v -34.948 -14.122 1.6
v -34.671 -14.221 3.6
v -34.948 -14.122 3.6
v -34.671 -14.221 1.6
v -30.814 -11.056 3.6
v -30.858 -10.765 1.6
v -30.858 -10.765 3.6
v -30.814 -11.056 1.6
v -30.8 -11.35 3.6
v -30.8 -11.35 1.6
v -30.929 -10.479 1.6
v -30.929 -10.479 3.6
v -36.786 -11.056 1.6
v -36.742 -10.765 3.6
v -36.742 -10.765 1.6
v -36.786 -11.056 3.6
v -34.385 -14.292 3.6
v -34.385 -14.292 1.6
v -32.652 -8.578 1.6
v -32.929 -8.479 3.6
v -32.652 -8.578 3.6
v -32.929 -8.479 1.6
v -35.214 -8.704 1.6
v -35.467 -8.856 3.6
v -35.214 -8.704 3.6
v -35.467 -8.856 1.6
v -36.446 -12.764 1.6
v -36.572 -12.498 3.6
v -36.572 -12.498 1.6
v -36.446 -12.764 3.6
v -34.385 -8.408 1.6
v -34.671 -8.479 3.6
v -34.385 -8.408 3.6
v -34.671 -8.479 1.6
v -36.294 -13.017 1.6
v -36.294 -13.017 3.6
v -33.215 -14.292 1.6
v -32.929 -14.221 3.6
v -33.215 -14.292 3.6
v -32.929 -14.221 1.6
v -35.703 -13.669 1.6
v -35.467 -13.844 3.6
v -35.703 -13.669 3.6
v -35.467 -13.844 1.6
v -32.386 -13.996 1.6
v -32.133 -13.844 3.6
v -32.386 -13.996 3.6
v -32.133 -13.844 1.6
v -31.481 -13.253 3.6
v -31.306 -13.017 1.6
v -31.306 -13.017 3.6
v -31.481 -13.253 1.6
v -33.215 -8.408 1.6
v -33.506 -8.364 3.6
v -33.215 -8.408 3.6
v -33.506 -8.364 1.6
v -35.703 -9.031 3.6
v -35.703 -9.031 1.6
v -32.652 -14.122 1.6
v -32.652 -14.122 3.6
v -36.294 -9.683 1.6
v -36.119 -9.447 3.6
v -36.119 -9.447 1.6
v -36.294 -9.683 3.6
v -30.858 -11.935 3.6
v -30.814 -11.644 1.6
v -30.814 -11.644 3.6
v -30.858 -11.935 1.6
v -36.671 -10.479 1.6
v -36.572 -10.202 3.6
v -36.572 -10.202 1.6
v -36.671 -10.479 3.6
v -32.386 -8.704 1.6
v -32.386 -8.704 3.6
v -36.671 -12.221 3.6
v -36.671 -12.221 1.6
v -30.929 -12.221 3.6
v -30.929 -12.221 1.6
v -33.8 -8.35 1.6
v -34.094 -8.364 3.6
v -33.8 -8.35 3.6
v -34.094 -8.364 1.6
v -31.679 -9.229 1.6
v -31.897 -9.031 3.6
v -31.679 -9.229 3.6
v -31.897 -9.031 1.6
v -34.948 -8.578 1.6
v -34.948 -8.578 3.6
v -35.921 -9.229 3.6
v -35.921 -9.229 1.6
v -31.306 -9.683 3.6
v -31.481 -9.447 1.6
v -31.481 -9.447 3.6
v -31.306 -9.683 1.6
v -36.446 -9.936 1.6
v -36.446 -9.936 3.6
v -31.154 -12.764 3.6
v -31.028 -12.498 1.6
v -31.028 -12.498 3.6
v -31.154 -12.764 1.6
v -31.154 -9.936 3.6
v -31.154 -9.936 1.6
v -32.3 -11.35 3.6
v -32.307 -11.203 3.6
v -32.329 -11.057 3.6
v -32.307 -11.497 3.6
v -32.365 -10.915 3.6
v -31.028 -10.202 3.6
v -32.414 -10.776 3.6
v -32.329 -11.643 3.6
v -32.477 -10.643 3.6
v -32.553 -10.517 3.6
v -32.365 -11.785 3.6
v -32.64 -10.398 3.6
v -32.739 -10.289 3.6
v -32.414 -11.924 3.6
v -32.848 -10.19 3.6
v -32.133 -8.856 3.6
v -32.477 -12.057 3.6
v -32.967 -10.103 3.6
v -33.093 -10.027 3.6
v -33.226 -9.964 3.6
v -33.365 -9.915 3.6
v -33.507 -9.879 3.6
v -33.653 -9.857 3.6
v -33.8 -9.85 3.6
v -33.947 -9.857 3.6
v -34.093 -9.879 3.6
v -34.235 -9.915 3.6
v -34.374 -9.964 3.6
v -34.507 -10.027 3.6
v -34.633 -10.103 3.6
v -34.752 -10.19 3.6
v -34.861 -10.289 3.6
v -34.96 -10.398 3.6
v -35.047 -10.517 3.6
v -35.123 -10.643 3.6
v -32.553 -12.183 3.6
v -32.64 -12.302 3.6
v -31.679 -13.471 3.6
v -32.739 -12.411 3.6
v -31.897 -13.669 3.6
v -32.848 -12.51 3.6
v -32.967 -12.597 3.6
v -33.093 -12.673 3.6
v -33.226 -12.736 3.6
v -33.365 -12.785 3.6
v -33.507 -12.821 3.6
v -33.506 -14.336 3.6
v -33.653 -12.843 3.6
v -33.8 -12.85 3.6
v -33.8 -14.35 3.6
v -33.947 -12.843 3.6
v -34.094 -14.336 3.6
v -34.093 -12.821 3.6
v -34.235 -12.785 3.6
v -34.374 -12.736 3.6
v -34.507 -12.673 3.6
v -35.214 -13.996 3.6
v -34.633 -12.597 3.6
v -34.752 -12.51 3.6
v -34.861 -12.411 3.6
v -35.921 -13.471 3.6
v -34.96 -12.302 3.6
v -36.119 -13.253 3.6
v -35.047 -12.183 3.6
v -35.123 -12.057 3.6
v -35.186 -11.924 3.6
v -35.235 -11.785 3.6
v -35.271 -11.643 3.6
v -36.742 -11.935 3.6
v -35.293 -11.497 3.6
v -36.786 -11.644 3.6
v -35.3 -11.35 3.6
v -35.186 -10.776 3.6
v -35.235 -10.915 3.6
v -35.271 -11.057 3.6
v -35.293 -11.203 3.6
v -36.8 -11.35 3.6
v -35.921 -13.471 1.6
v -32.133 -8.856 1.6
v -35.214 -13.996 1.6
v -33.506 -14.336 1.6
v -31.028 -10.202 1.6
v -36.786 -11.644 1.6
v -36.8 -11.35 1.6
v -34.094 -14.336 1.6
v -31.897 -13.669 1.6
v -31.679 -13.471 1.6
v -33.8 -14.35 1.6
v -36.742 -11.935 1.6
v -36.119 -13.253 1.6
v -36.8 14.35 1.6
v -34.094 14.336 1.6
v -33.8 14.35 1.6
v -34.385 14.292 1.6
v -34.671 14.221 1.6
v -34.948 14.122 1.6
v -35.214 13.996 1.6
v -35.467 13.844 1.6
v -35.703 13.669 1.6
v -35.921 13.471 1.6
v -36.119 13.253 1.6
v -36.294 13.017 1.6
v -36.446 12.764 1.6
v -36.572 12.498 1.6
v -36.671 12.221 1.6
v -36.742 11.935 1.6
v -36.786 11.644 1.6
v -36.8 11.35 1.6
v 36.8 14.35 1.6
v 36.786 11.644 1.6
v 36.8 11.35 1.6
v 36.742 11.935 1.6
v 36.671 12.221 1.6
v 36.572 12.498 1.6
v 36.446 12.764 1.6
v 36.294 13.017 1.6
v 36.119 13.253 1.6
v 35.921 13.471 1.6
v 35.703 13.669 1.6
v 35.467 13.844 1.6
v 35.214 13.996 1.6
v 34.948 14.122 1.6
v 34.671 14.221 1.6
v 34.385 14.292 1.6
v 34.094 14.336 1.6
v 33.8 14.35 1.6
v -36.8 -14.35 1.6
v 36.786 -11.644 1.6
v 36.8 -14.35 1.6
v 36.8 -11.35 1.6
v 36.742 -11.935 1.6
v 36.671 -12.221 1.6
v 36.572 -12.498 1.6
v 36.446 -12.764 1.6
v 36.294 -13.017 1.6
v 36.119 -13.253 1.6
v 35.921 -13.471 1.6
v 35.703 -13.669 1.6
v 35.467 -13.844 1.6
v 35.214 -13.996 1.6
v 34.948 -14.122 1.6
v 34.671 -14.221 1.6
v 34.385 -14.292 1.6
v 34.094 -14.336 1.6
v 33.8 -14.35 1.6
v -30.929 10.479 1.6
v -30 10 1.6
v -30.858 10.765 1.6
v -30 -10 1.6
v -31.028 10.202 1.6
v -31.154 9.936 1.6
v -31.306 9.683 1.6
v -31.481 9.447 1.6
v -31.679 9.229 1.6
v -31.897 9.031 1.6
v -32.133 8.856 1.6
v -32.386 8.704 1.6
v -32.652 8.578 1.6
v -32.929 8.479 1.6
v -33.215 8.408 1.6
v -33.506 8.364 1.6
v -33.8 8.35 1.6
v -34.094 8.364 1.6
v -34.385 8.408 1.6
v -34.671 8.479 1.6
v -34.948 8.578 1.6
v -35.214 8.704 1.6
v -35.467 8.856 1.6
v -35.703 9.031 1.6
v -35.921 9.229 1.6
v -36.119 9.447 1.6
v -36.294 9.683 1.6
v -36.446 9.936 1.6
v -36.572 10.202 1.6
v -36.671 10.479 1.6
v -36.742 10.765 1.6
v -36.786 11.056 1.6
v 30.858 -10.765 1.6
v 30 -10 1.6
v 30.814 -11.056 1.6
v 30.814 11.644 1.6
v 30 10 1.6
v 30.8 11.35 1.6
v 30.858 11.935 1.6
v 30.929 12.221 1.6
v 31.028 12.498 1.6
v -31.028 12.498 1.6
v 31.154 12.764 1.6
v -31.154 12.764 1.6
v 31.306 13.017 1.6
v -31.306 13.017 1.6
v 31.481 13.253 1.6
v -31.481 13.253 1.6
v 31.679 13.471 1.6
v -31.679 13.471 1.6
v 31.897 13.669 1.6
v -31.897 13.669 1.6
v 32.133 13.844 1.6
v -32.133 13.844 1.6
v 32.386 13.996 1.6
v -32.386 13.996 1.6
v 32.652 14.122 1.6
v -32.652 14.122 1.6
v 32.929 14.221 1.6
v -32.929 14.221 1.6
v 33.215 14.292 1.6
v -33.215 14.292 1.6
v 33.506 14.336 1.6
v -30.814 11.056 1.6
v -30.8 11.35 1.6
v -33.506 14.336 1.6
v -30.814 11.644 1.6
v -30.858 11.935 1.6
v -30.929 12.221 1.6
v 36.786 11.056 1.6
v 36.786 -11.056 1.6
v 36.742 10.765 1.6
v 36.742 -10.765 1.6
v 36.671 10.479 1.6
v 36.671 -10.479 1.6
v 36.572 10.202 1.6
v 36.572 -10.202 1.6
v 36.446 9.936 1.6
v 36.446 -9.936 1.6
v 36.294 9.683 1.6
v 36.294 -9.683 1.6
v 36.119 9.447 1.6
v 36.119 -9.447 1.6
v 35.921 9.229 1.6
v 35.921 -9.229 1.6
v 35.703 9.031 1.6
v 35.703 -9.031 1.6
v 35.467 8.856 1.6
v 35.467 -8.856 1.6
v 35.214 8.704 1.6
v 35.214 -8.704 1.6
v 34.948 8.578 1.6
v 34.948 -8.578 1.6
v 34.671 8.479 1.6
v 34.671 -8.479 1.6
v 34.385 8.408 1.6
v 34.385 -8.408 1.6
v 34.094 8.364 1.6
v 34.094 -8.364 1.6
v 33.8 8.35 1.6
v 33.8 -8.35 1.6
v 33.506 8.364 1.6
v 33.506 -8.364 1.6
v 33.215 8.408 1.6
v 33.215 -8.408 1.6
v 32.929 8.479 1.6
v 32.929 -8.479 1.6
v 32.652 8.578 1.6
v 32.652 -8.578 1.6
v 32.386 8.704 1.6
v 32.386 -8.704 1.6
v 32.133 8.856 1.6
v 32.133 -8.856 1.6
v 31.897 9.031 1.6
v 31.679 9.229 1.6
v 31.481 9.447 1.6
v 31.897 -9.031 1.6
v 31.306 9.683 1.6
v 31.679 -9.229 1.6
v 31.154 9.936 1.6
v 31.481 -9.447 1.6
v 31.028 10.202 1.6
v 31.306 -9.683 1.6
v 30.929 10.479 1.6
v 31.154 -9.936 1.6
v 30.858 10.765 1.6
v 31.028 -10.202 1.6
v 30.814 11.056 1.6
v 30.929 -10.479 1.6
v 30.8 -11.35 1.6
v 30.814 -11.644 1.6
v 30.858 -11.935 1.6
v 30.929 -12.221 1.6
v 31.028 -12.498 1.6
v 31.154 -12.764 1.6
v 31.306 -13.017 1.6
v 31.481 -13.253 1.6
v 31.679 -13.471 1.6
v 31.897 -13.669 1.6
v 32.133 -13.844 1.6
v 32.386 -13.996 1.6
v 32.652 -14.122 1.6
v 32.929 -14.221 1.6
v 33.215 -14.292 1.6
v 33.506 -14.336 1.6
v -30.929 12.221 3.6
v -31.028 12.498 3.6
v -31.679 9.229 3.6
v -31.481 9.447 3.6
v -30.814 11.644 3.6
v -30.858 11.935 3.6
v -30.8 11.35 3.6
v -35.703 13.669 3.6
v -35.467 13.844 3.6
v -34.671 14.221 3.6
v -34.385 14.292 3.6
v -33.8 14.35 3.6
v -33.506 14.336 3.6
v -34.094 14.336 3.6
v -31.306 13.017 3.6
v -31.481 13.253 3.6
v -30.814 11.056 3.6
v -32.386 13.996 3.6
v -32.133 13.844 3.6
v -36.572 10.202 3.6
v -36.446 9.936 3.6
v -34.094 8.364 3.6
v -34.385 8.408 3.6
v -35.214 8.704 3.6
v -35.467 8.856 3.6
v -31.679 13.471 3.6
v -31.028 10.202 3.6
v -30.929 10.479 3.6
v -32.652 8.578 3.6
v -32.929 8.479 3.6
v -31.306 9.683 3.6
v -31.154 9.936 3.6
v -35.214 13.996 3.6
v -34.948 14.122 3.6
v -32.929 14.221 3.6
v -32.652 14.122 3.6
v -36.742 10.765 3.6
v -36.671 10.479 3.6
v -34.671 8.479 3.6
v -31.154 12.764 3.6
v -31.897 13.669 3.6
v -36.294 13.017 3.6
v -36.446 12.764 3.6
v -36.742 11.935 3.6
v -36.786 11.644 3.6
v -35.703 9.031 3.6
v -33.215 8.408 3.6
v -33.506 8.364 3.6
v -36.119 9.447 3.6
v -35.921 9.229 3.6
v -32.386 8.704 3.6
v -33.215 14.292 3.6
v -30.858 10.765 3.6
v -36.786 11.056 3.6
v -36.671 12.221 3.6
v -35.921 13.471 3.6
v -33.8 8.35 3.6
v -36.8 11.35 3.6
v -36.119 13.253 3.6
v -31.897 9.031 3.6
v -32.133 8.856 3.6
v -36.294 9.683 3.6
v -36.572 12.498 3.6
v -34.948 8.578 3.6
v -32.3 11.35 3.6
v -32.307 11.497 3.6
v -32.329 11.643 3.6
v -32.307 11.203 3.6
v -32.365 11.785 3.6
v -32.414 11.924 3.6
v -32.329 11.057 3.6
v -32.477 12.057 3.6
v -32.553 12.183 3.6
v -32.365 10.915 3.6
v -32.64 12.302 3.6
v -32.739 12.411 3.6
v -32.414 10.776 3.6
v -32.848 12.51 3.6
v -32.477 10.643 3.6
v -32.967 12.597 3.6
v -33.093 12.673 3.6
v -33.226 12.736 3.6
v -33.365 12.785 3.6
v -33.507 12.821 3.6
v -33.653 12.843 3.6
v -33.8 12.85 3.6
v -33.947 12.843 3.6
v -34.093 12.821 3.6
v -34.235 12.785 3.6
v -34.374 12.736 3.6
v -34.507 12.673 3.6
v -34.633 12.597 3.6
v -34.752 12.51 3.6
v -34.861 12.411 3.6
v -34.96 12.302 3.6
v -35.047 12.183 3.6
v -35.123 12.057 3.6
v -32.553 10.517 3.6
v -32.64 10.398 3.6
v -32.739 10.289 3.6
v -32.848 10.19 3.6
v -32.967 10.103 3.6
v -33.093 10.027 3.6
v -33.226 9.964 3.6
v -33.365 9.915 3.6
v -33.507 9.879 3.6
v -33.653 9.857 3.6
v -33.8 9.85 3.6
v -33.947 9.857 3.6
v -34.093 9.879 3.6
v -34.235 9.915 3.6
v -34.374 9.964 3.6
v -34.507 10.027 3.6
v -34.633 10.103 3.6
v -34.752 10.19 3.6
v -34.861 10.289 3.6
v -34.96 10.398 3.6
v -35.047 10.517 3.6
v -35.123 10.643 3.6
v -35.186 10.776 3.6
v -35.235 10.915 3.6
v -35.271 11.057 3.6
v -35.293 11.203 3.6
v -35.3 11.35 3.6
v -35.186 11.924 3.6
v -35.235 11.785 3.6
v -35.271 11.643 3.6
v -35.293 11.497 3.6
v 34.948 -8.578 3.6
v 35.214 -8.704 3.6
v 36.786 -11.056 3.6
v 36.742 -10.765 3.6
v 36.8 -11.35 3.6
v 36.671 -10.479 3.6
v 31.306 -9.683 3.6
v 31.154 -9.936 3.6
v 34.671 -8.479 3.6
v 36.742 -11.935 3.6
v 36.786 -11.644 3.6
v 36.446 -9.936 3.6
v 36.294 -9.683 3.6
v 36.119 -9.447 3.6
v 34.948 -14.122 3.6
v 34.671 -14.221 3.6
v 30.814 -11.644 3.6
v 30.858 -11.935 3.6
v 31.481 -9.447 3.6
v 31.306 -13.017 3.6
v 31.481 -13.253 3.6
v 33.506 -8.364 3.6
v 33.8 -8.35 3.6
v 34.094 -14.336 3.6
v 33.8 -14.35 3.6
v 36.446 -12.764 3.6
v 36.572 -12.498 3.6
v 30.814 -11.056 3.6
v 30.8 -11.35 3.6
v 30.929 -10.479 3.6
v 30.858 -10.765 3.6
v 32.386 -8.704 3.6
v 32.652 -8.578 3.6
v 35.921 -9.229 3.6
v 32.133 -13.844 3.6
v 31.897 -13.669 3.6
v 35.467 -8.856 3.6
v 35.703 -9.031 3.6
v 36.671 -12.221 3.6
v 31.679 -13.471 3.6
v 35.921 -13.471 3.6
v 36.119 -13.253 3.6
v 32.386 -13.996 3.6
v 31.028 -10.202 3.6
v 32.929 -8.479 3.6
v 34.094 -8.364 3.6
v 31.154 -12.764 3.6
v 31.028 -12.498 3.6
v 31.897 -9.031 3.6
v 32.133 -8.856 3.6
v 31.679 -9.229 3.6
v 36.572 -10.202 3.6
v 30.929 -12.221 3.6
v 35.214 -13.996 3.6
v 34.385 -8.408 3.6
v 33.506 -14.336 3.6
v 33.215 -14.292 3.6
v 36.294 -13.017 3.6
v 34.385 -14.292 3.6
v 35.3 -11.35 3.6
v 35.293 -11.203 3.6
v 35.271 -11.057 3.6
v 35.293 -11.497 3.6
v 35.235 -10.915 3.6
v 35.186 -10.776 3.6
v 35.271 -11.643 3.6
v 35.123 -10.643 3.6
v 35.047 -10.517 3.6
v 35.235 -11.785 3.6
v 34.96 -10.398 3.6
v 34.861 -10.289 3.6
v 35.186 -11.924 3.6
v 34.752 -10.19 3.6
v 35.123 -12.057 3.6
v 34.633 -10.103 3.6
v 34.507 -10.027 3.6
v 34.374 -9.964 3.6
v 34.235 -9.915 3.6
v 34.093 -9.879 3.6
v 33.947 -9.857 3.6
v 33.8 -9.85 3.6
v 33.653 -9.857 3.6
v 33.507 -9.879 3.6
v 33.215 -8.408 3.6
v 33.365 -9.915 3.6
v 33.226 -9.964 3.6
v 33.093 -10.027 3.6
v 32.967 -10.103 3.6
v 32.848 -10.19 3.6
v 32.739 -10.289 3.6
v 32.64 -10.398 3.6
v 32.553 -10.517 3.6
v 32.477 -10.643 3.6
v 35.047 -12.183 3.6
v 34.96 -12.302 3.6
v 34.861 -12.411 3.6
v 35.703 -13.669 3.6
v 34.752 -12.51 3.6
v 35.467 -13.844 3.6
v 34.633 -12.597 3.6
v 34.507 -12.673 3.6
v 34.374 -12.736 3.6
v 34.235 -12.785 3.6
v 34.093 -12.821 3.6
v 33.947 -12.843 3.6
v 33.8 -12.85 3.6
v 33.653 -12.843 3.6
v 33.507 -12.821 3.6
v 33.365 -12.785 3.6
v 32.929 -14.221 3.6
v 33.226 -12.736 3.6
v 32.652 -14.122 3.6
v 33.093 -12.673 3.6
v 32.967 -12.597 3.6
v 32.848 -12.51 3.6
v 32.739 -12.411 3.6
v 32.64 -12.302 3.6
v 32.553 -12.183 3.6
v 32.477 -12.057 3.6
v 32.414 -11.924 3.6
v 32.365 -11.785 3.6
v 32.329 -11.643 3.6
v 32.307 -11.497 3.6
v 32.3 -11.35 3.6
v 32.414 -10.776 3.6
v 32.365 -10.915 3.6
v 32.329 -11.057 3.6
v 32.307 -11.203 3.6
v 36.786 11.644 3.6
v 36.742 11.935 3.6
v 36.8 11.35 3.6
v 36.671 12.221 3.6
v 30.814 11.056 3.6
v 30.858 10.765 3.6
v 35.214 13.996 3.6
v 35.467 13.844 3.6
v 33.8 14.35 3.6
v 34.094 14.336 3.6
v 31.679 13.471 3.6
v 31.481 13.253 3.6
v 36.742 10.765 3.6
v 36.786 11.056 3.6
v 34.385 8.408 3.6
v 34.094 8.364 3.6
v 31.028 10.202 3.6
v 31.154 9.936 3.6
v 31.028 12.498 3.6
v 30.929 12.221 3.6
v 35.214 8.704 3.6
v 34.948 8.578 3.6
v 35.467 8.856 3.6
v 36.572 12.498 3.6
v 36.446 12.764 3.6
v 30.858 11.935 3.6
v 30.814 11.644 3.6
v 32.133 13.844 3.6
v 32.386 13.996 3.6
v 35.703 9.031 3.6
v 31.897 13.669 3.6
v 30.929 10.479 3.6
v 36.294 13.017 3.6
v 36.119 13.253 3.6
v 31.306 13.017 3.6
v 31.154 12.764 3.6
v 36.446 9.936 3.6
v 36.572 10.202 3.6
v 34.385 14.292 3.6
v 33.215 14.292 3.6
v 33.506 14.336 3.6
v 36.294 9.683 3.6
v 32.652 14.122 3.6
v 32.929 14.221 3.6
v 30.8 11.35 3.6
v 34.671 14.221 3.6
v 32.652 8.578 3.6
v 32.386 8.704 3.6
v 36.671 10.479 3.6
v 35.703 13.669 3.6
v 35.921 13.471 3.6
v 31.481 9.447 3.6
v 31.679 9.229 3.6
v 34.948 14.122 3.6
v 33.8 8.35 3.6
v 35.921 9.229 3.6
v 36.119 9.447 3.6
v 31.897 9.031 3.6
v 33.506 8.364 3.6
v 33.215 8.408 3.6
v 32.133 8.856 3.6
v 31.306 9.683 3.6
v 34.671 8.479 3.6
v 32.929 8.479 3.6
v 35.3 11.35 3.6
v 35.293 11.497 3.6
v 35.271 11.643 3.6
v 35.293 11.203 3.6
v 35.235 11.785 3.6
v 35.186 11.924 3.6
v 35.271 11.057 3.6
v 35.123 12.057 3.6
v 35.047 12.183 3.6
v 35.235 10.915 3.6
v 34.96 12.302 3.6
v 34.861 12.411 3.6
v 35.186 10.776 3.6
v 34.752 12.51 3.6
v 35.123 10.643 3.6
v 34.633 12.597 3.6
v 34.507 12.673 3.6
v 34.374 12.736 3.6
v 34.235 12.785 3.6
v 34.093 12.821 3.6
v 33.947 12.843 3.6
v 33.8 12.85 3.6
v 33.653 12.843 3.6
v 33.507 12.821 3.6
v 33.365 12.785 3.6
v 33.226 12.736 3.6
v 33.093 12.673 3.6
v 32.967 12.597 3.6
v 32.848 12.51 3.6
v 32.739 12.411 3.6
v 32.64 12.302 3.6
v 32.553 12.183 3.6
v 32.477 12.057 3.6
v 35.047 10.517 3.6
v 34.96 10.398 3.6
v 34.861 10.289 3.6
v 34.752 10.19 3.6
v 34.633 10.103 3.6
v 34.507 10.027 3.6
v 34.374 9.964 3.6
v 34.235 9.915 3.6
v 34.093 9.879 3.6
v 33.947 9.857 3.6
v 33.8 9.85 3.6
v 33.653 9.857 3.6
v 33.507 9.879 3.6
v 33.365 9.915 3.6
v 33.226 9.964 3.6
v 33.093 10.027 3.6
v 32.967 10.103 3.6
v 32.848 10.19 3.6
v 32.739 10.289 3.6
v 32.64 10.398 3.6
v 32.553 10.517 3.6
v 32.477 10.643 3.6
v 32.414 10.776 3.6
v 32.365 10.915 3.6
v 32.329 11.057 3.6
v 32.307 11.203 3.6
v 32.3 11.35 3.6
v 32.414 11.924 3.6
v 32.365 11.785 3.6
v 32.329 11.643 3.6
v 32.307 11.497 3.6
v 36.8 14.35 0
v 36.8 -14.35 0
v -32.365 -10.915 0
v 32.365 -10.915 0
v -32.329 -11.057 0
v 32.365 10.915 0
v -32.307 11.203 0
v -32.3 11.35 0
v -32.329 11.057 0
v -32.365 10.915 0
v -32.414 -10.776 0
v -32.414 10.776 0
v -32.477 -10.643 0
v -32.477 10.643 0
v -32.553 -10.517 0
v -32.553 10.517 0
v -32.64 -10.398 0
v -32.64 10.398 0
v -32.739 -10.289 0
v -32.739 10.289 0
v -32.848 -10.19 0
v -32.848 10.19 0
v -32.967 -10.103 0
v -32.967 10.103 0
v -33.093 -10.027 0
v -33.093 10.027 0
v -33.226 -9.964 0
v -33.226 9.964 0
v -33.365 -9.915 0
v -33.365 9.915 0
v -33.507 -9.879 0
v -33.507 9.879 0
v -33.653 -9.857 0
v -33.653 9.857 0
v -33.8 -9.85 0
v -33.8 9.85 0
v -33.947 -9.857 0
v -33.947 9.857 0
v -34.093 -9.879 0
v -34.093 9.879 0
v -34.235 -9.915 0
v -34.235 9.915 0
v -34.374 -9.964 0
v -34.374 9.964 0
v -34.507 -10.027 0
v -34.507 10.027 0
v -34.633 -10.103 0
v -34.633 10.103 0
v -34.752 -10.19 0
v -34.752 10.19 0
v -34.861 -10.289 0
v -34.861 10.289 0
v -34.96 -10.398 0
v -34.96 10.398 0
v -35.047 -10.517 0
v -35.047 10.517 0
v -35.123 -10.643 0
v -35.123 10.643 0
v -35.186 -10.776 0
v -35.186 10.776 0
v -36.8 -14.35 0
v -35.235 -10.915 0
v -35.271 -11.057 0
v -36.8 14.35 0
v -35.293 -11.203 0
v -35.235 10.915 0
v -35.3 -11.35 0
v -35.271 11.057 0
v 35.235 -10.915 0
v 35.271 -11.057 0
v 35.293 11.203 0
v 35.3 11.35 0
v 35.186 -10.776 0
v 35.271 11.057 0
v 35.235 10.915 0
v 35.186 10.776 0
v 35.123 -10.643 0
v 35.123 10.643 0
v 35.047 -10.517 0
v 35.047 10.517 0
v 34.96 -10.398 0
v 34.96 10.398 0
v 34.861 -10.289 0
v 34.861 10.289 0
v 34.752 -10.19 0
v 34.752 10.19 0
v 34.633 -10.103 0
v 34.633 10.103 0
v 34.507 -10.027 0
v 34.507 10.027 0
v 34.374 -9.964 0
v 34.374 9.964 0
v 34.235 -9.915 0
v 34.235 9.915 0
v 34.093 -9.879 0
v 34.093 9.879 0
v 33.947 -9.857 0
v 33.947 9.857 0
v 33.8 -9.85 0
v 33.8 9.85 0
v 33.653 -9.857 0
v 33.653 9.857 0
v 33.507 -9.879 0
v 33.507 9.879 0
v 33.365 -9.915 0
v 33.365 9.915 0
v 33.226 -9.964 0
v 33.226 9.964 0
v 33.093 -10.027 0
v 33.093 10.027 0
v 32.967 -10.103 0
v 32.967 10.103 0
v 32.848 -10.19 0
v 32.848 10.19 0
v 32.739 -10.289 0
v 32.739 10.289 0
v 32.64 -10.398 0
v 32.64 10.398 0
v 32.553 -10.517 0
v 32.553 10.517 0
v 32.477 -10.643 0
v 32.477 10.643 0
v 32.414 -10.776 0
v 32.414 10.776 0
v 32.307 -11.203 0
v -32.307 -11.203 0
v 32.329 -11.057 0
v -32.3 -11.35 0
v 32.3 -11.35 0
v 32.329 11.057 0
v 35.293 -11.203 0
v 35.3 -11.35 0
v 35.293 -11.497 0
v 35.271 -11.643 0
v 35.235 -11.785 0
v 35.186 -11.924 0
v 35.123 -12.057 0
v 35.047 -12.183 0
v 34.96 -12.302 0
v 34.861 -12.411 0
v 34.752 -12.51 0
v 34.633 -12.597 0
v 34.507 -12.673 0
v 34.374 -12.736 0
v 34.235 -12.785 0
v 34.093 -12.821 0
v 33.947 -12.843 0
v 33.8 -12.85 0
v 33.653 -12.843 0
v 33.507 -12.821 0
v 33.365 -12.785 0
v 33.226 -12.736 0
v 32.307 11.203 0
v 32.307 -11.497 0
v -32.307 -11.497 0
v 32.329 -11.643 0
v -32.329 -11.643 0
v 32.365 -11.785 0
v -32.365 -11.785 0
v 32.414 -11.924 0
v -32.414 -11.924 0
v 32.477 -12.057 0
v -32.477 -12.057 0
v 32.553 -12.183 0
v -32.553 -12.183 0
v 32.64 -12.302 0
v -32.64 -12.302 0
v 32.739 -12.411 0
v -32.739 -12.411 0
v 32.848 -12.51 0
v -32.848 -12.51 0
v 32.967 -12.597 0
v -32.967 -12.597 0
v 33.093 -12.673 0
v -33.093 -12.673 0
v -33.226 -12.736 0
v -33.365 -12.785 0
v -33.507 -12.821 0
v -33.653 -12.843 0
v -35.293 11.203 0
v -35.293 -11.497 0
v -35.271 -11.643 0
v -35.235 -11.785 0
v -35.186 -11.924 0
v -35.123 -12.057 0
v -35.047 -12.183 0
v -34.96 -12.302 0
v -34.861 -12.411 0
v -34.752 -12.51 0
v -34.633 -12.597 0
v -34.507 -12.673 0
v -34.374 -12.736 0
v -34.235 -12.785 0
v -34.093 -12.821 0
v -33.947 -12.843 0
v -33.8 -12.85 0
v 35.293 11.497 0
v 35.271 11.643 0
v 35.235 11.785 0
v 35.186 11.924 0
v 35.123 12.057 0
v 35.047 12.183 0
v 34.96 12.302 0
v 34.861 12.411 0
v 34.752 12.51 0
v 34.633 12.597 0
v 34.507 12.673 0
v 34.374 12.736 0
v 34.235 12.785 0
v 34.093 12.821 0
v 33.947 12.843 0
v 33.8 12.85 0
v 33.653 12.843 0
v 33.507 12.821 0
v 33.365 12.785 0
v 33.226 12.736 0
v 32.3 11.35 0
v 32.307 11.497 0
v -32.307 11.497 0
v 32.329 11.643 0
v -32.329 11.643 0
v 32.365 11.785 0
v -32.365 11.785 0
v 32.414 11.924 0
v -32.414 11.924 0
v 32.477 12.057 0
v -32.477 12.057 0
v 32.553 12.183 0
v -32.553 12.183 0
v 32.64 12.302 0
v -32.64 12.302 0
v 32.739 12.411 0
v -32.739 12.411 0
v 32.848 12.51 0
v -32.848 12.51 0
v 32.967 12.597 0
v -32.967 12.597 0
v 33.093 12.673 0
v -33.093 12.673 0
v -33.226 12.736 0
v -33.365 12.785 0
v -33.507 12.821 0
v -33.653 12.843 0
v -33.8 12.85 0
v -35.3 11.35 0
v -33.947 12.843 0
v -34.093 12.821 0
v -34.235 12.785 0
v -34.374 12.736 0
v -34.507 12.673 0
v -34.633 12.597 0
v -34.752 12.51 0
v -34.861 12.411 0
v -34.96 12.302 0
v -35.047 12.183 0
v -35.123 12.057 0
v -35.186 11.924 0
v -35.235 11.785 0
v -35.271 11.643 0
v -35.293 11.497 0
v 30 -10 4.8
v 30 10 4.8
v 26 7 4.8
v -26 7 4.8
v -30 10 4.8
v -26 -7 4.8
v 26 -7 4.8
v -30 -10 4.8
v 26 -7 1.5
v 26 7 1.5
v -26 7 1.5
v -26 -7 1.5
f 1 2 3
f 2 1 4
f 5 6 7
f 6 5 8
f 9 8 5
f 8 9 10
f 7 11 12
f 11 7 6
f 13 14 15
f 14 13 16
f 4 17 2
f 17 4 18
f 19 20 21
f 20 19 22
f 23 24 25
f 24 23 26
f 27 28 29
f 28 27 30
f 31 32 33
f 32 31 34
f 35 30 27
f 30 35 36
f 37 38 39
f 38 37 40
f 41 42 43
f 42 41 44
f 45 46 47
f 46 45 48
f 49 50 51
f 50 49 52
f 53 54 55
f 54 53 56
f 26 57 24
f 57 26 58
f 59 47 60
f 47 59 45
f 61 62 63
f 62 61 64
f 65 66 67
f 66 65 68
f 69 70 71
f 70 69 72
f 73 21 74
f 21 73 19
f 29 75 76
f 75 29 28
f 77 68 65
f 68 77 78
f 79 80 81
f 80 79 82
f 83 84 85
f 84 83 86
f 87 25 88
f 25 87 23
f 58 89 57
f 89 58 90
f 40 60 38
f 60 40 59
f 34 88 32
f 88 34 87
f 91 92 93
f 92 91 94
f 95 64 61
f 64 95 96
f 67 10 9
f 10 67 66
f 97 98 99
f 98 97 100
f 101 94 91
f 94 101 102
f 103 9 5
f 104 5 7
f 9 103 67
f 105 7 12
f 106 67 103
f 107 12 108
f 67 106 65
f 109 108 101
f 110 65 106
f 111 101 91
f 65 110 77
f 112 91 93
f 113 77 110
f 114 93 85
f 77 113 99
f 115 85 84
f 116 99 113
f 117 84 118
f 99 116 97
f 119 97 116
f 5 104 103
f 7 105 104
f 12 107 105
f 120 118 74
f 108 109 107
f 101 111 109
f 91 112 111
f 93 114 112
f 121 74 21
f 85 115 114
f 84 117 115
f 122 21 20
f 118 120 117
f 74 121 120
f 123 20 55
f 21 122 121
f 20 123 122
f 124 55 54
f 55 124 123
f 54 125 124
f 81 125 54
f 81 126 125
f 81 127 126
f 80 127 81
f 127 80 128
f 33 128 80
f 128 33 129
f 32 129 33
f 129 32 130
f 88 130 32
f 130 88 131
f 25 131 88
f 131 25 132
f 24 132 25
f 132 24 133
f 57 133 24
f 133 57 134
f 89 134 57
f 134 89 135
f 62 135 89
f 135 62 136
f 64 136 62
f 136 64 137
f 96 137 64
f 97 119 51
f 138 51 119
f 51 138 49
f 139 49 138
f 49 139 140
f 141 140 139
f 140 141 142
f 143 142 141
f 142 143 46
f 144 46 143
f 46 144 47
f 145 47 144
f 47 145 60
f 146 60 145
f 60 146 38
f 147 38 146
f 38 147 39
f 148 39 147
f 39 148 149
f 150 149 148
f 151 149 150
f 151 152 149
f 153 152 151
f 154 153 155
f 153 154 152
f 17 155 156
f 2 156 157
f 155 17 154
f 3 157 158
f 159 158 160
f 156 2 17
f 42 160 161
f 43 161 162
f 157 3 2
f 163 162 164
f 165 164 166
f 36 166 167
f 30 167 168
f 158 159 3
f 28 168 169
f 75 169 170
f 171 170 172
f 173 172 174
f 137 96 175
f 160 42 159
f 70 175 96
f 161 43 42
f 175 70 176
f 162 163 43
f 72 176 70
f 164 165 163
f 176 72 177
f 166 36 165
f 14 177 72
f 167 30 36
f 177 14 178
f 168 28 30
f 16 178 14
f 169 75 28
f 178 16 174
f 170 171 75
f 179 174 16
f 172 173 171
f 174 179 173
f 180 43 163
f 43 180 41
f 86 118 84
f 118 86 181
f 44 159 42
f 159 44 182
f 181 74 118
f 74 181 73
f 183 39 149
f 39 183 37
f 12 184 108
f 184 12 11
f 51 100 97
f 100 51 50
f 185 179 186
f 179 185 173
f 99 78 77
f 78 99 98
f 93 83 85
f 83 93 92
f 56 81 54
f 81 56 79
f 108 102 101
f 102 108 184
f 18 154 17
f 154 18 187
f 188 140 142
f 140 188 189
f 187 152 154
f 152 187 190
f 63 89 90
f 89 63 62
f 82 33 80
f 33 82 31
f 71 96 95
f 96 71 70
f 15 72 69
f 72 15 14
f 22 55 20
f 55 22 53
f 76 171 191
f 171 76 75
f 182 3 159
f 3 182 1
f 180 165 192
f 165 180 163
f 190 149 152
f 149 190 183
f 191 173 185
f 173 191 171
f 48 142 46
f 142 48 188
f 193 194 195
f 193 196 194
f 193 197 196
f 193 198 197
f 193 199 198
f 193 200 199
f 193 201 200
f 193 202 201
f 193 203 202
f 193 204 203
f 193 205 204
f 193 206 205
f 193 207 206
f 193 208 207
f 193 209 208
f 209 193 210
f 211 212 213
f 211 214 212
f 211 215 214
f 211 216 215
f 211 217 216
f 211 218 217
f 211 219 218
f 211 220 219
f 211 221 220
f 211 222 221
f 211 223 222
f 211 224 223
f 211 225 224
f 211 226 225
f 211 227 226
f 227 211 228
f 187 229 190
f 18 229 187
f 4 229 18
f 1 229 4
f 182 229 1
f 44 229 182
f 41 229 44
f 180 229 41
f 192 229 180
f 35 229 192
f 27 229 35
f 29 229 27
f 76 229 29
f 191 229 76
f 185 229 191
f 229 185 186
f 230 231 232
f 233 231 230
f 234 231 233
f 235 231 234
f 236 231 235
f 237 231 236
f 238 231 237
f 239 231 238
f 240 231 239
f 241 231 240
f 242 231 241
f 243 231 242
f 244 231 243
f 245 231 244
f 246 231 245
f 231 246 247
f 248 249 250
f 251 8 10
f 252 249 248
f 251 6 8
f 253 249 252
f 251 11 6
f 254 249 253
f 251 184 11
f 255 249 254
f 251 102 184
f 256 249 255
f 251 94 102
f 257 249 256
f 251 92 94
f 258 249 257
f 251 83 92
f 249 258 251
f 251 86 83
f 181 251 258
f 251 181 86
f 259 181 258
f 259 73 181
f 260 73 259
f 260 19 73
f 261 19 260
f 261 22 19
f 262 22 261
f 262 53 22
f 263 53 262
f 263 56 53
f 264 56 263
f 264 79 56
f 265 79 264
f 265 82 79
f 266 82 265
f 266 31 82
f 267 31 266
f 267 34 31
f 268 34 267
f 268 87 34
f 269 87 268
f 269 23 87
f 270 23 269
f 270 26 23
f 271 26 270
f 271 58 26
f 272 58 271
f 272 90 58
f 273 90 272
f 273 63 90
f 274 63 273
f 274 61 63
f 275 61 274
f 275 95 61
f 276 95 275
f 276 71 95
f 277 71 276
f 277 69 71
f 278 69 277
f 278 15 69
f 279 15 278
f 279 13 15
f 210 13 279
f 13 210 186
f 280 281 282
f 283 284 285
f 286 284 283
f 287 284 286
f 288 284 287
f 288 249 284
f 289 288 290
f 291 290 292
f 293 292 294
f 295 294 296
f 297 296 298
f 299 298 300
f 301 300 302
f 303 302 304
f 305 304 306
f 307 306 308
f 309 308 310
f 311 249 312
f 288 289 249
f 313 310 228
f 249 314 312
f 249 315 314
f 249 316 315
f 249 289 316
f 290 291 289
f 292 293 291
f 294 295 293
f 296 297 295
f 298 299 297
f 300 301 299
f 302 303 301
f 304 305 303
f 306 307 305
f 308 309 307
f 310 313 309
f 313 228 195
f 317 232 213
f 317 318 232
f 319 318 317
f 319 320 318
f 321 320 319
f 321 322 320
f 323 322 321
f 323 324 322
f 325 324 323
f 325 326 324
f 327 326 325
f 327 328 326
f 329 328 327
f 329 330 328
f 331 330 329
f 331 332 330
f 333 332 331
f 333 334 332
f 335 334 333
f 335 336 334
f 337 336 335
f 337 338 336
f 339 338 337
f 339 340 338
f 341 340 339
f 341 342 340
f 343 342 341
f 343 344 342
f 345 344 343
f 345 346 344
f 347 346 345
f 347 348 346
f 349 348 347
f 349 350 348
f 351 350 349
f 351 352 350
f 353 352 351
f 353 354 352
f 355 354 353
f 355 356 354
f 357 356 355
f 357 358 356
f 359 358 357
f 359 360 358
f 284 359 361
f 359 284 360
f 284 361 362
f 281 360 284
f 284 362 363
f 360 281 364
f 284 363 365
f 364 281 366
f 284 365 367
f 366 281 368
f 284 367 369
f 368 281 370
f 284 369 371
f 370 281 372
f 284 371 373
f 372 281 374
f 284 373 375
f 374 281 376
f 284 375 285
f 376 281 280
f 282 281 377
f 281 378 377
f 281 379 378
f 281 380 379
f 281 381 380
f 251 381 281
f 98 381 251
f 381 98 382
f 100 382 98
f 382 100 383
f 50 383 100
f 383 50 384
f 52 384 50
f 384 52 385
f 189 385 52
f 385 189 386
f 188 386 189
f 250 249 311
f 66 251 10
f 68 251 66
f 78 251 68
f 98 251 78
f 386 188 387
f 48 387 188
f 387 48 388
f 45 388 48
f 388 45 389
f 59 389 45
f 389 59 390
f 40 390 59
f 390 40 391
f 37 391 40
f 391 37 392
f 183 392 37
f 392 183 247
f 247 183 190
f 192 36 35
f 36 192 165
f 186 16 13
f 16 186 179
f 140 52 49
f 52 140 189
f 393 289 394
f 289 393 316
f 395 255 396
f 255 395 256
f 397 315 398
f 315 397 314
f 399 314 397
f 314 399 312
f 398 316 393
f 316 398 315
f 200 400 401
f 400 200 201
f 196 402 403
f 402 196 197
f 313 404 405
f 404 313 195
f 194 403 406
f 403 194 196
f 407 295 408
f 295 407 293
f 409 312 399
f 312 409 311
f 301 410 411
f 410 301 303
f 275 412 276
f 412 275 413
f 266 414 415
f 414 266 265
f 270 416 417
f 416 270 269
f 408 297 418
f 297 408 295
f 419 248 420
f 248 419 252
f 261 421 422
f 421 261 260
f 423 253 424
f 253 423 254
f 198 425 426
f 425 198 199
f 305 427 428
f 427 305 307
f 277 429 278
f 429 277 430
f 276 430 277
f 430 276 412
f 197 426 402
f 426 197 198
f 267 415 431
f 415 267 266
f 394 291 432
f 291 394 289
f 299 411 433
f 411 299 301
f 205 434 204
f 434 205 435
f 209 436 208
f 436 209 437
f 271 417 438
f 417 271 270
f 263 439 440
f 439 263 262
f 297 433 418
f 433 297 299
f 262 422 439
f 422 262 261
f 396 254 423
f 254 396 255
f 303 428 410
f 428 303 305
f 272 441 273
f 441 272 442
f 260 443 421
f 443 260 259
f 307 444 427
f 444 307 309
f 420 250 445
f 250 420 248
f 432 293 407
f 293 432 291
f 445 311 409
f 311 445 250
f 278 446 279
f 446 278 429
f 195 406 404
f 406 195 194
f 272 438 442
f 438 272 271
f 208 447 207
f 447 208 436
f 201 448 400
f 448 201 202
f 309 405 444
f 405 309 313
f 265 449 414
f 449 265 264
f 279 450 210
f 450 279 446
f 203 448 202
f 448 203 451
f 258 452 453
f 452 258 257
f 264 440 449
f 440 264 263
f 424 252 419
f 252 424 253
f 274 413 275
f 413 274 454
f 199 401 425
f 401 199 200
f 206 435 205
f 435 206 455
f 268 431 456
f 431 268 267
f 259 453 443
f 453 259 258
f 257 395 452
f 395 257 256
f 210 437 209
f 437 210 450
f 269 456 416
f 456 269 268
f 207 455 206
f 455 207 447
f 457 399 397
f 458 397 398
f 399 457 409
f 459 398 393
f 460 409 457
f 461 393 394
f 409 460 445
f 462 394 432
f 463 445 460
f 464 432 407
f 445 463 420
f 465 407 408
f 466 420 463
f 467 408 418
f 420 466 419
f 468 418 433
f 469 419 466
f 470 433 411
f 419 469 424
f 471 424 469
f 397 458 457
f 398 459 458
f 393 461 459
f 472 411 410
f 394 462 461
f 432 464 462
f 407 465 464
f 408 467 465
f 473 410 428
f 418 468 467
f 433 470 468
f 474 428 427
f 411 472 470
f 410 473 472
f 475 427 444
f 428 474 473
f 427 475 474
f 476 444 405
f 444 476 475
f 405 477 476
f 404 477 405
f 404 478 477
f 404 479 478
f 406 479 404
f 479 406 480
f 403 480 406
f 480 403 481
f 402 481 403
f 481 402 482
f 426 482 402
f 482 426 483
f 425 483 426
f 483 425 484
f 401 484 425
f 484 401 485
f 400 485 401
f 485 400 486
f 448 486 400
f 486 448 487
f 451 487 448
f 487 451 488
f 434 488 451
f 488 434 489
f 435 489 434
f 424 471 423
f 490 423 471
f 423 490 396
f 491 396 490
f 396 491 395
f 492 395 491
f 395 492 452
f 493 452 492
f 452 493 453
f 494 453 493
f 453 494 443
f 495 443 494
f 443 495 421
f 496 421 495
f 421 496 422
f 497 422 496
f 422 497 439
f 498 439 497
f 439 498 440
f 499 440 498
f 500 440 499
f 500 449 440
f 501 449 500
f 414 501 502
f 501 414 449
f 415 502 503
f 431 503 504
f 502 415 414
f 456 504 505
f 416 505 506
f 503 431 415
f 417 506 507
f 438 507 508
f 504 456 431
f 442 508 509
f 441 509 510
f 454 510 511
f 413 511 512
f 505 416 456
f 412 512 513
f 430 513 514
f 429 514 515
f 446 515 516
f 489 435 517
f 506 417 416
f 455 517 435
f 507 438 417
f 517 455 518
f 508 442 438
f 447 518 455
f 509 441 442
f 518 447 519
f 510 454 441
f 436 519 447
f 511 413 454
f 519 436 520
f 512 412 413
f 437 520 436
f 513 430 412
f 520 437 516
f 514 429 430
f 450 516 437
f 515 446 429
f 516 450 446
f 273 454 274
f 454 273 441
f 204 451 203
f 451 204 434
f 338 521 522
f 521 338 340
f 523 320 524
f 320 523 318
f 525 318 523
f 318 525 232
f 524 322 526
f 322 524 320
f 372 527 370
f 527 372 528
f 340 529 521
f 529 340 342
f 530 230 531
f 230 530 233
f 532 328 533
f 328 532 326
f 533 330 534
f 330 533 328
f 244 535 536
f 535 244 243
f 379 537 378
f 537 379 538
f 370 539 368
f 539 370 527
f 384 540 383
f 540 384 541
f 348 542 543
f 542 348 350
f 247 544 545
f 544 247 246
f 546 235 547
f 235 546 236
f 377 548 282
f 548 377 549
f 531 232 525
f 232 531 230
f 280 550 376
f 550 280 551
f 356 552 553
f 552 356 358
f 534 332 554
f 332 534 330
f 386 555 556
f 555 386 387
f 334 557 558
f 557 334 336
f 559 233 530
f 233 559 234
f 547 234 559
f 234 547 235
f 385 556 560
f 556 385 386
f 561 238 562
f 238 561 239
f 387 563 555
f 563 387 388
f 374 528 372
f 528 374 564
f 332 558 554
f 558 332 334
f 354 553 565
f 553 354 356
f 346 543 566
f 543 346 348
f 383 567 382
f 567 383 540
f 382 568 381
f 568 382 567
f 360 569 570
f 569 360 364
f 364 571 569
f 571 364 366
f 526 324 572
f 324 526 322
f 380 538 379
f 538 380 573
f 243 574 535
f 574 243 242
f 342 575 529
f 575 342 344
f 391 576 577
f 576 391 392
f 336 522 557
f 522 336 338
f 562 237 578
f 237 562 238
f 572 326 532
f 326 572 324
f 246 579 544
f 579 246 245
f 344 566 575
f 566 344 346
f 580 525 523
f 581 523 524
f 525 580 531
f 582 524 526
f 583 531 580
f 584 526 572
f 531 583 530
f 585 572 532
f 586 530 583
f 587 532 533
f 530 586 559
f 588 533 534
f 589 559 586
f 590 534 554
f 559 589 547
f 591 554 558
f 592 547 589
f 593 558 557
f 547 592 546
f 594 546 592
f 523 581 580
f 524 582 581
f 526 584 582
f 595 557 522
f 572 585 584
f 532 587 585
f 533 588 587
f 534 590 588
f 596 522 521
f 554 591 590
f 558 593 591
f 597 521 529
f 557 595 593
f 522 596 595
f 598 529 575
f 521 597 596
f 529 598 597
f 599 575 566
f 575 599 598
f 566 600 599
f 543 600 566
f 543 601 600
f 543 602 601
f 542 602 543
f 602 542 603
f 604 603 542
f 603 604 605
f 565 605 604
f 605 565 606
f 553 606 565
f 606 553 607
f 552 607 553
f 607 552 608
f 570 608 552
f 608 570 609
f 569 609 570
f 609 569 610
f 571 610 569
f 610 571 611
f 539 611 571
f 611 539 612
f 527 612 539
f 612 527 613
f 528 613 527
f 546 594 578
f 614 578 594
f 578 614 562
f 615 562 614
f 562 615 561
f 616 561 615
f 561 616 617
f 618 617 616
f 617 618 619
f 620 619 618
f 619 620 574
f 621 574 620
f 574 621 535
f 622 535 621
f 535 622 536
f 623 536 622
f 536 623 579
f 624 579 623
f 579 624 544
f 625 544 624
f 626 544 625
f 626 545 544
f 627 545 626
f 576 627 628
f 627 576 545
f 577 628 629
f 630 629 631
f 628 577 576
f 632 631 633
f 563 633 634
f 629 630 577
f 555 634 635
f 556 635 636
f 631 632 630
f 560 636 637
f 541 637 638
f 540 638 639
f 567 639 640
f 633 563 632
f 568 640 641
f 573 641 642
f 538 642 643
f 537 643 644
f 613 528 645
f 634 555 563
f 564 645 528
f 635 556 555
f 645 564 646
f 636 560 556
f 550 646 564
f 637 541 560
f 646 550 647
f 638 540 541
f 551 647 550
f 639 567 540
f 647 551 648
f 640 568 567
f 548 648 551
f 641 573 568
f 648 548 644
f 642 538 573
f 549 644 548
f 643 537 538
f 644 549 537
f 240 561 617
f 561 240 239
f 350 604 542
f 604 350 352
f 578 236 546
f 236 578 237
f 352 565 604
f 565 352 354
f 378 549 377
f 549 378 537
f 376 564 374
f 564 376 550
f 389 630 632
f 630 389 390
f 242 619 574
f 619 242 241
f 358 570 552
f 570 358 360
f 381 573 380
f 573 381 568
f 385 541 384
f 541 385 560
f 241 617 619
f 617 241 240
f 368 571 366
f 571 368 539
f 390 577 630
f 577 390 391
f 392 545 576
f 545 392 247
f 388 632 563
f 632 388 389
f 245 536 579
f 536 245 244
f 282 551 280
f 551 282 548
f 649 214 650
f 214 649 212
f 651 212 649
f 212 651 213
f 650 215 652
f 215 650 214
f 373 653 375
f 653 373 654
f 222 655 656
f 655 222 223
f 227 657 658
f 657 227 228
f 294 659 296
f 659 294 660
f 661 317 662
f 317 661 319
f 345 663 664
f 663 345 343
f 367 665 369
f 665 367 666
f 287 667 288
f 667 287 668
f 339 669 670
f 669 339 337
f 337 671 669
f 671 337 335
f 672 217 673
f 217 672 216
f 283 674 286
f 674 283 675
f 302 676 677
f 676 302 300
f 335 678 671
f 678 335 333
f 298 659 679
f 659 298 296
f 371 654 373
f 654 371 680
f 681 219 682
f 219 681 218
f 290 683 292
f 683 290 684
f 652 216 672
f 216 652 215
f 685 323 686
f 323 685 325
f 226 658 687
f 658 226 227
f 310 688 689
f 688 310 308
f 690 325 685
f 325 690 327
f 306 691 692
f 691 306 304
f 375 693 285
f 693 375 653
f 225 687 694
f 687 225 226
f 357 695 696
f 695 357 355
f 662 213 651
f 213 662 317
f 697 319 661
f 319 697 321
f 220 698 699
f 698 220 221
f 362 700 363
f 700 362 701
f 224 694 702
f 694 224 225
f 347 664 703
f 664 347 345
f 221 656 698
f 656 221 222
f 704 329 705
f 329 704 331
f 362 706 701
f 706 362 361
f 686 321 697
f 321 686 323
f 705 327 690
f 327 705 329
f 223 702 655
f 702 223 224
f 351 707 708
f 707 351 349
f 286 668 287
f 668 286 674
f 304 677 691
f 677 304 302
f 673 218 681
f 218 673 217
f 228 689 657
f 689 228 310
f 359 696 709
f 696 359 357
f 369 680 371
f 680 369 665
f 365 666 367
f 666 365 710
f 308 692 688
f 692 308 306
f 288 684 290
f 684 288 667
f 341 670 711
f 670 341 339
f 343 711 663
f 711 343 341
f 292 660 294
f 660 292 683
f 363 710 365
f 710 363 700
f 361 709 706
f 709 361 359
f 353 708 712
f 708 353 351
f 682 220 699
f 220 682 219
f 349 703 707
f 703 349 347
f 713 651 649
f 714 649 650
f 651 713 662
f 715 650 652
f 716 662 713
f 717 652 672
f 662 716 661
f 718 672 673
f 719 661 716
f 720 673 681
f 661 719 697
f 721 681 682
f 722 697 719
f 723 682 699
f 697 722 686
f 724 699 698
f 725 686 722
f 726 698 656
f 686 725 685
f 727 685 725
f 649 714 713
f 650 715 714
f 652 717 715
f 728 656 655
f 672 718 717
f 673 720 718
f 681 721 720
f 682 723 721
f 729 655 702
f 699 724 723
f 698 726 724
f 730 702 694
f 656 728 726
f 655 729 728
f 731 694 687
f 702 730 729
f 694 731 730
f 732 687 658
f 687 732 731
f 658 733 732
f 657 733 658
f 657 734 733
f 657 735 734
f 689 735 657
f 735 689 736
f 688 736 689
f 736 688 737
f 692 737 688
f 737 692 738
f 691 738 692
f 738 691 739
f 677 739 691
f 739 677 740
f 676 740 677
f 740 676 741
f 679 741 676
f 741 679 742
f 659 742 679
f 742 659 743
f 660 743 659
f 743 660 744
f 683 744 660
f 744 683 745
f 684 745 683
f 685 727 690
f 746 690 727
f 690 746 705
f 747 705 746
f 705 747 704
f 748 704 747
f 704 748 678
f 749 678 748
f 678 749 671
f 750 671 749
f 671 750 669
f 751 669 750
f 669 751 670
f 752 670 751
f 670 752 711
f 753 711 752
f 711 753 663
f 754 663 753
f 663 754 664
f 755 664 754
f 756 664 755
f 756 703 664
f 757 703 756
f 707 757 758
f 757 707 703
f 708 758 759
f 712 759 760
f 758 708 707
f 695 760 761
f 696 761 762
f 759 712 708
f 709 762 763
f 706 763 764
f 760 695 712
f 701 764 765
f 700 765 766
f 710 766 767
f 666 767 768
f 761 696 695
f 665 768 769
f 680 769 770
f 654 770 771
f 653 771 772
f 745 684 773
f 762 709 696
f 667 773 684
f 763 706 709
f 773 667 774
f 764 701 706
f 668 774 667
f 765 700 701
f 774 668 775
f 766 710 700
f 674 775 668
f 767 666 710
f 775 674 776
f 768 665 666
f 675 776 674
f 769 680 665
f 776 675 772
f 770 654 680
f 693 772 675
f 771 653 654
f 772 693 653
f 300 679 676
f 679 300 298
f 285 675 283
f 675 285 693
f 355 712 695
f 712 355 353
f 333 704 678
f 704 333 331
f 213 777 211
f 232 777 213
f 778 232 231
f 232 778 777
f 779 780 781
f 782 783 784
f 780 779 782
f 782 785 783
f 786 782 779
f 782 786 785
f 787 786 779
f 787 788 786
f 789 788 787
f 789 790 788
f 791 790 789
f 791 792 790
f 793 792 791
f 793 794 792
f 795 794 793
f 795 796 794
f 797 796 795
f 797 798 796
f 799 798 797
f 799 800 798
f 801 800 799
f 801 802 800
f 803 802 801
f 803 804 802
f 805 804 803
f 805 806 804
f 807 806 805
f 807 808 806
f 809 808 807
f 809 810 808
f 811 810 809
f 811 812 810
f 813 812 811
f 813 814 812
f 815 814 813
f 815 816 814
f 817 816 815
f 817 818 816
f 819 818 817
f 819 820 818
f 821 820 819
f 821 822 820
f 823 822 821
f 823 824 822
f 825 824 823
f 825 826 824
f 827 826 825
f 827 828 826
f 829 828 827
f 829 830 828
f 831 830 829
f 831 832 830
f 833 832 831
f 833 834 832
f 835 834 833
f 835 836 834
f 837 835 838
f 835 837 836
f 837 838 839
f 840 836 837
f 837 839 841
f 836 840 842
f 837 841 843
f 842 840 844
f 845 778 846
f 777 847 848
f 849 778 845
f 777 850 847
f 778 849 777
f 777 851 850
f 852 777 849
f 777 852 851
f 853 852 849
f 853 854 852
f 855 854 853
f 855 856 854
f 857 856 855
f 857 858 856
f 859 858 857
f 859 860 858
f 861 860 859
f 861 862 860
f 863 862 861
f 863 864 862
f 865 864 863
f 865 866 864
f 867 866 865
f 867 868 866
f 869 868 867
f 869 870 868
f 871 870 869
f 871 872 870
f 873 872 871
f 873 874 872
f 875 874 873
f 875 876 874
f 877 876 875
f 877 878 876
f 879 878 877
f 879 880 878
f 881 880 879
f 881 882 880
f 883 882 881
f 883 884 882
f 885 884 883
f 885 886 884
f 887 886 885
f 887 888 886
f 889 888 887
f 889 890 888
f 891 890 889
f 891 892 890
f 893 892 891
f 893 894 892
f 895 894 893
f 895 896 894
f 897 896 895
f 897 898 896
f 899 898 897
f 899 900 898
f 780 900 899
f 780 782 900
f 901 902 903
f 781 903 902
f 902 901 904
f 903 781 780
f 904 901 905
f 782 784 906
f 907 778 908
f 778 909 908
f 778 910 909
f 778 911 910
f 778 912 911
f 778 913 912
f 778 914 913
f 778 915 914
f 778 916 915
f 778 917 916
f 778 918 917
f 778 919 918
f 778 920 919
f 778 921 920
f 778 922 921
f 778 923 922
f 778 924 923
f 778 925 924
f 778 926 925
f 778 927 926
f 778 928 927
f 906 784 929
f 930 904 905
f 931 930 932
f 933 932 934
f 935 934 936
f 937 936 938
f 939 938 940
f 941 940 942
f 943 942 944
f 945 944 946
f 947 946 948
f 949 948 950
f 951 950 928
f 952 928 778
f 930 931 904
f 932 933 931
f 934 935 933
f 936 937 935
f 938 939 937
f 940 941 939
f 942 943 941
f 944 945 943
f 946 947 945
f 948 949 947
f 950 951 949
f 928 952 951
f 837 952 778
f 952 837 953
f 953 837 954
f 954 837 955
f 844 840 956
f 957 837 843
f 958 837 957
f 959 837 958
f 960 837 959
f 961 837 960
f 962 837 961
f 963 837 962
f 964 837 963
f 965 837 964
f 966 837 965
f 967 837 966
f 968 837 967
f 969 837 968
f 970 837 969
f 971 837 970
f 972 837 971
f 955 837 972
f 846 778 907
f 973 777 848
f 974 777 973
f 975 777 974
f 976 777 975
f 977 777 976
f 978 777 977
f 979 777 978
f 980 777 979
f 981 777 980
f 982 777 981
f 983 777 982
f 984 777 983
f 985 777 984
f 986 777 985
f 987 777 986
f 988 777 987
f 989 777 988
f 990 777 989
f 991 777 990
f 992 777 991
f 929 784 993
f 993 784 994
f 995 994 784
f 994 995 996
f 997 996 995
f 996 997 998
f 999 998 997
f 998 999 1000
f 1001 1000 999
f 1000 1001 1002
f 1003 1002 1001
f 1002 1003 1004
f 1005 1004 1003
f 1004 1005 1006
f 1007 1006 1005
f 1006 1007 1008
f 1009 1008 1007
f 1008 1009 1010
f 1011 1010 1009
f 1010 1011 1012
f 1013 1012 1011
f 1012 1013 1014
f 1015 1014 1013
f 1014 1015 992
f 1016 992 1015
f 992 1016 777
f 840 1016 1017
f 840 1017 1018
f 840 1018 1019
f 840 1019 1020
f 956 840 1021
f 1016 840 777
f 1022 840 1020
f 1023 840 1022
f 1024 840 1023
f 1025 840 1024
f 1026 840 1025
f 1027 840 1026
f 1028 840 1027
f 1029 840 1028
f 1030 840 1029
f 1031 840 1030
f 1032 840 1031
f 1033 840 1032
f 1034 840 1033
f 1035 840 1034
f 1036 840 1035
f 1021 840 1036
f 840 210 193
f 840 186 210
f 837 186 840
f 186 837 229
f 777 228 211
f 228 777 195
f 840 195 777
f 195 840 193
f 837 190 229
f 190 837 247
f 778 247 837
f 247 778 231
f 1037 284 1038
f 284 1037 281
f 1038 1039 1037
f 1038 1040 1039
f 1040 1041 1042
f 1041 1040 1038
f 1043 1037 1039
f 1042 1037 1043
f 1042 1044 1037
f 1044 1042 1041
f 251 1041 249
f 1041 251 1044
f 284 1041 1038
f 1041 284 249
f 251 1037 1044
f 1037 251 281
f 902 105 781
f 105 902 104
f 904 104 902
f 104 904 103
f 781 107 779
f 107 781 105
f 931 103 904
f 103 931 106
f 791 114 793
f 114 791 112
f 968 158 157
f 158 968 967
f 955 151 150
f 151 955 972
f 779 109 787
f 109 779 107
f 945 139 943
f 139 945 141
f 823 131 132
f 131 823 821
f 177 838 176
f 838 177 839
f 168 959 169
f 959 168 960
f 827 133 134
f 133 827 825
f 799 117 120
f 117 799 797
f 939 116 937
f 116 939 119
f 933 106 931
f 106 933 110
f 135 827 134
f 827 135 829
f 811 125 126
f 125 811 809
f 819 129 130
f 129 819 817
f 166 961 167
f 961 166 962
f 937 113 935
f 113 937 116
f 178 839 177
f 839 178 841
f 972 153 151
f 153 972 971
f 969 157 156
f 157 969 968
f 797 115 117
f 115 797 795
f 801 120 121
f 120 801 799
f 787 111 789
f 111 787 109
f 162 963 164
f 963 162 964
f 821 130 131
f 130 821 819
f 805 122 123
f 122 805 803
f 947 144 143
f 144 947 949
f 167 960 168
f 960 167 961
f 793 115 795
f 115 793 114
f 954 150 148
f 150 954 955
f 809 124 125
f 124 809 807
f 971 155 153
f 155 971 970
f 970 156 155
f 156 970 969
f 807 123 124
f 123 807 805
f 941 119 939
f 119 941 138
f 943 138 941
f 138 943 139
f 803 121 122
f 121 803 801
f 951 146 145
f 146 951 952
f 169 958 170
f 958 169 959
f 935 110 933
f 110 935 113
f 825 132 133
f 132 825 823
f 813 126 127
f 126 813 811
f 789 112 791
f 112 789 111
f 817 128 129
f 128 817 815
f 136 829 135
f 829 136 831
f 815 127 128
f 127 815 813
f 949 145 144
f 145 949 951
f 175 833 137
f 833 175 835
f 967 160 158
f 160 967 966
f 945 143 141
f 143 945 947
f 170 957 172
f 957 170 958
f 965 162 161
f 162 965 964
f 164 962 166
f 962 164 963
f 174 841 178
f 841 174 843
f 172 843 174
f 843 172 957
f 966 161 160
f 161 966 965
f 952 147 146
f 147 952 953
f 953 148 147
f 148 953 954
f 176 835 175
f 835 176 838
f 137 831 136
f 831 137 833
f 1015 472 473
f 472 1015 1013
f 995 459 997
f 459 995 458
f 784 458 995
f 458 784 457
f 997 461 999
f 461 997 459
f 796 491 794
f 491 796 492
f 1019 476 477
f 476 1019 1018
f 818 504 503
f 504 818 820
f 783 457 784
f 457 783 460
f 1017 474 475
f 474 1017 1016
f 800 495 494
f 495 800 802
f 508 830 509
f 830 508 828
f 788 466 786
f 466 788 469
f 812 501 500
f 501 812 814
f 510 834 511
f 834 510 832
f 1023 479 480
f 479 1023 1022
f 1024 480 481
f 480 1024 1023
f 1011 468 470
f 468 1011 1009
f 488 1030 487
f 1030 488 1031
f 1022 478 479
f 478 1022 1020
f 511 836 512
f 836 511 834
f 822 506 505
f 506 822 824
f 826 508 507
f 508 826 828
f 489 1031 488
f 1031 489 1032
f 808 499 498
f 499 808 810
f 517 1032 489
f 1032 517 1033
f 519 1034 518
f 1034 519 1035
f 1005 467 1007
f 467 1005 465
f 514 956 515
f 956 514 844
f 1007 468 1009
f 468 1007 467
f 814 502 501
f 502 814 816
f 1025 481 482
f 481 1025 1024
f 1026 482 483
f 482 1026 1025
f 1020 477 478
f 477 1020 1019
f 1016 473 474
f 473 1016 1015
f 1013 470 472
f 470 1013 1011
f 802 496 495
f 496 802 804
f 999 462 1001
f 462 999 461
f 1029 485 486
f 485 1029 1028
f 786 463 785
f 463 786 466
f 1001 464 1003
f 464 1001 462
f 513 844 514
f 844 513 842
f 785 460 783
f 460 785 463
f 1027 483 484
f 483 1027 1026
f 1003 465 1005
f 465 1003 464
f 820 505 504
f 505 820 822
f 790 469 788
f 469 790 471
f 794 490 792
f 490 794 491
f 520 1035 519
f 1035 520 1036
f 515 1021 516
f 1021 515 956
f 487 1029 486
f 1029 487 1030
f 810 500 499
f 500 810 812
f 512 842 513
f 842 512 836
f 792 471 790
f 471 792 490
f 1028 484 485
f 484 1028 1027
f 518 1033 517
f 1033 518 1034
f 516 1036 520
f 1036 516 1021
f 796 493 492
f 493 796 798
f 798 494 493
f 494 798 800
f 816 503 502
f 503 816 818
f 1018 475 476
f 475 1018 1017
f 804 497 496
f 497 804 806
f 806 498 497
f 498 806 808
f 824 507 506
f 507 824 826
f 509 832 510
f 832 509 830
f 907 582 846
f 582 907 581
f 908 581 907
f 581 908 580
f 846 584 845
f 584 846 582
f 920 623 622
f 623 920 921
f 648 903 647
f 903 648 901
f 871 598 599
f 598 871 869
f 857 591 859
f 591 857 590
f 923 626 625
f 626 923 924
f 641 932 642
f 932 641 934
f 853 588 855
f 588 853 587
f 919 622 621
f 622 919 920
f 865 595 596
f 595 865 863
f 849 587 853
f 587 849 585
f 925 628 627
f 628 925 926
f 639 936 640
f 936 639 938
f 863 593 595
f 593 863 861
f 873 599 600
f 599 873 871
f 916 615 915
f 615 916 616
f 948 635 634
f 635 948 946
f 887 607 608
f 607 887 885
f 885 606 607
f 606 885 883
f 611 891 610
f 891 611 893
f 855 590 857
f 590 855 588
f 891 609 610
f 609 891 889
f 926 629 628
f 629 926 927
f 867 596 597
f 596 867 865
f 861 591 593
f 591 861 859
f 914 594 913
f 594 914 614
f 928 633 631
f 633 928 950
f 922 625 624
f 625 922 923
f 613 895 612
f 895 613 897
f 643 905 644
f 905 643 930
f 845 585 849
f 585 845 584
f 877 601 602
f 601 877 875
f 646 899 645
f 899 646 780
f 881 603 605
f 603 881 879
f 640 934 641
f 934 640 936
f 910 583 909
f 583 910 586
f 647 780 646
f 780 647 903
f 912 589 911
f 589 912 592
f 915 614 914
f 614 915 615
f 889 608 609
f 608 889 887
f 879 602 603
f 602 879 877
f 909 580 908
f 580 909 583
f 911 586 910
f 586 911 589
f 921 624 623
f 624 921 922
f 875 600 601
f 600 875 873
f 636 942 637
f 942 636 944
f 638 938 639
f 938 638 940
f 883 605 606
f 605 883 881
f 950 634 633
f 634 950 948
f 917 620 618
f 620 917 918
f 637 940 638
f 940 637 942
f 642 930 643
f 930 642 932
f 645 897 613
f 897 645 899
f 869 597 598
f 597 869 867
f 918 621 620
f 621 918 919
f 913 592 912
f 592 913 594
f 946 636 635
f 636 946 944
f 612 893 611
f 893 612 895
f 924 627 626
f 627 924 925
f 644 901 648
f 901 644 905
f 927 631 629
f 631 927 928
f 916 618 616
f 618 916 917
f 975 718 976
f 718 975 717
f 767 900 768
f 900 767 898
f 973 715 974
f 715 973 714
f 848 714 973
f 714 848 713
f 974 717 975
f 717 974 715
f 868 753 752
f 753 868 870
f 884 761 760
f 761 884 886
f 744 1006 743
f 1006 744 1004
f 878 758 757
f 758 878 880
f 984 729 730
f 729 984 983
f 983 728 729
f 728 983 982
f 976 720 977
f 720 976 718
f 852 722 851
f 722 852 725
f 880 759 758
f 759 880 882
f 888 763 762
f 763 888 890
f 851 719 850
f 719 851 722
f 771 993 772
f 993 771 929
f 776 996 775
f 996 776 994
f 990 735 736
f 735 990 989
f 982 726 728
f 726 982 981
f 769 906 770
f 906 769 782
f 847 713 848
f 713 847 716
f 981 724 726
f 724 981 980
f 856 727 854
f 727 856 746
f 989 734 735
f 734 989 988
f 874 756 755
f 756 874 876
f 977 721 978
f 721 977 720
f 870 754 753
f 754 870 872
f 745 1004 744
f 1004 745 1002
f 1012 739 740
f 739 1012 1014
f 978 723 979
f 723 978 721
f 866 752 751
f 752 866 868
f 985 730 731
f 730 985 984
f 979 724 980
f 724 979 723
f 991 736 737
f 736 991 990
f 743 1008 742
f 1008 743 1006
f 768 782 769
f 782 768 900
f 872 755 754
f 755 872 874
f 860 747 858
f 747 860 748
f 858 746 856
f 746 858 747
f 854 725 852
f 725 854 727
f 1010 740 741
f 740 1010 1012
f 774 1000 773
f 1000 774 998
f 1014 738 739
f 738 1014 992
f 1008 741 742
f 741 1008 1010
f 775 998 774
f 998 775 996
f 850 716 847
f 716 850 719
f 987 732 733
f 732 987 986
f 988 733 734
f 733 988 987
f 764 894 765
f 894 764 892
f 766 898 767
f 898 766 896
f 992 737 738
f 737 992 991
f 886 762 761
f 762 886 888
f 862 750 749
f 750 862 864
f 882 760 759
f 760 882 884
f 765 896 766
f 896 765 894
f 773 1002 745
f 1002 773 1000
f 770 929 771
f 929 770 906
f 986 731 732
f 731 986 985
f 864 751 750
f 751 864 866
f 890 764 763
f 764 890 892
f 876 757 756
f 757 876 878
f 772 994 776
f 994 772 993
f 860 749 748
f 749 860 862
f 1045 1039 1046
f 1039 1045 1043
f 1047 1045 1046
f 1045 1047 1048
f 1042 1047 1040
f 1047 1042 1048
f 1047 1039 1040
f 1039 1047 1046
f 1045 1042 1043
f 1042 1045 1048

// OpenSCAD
$fn=64;

// LCD Display Module S-7282B (approx.)
// Overall: 73.6mm x 28.7mm
// Simple representative geometry: PCB + bezel + viewing window + 4 mounting holes

module lcd_s7282b(
    pcb_l=73.6,
    pcb_w=28.7,
    pcb_t=1.6,

    bezel_l=60.0,
    bezel_w=20.0,
    bezel_t=3.2,

    window_l=52.0,
    window_w=14.0,
    window_depth=1.2,

    hole_d=3.0,
    hole_edge=3.0,

    standoff_d=6.0,
    standoff_h=2.0
){
    // Derived hole positions (near corners)
    hx = pcb_l/2 - hole_edge;
    hy = pcb_w/2 - hole_edge;

    difference() {
        union() {
            // PCB
            color([0.05,0.35,0.12])
                translate([0,0,pcb_t/2])
                    cube([pcb_l, pcb_w, pcb_t], center=true);

            // Optional standoffs around holes (small bosses on top)
            color([0.05,0.35,0.12])
            for (sx=[-hx, hx], sy=[-hy, hy])
                translate([sx, sy, pcb_t])
                    cylinder(d=standoff_d, h=standoff_h);

            // Bezel / frame on top of PCB
            color([0.15,0.15,0.15])
                translate([0,0,pcb_t + bezel_t/2])
                    cube([bezel_l, bezel_w, bezel_t], center=true);

            // Glass area (slightly recessed into bezel)
            color([0.2,0.35,0.45,0.6])
                translate([0,0,pcb_t + bezel_t - window_depth/2])
                    cube([window_l, window_w, window_depth], center=true);
        }

        // Mounting holes through PCB (and standoffs)
        for (sx=[-hx, hx], sy=[-hy, hy])
            translate([sx, sy, -1])
                cylinder(d=hole_d, h=pcb_t + standoff_h + bezel_t + 3);

        // Viewing window cutout through bezel (to show glass)
        translate([0,0,pcb_t + bezel_t/2])
            cube([window_l, window_w, bezel_t + 0.2], center=true);
    }
}

// Render
lcd_s7282b();
